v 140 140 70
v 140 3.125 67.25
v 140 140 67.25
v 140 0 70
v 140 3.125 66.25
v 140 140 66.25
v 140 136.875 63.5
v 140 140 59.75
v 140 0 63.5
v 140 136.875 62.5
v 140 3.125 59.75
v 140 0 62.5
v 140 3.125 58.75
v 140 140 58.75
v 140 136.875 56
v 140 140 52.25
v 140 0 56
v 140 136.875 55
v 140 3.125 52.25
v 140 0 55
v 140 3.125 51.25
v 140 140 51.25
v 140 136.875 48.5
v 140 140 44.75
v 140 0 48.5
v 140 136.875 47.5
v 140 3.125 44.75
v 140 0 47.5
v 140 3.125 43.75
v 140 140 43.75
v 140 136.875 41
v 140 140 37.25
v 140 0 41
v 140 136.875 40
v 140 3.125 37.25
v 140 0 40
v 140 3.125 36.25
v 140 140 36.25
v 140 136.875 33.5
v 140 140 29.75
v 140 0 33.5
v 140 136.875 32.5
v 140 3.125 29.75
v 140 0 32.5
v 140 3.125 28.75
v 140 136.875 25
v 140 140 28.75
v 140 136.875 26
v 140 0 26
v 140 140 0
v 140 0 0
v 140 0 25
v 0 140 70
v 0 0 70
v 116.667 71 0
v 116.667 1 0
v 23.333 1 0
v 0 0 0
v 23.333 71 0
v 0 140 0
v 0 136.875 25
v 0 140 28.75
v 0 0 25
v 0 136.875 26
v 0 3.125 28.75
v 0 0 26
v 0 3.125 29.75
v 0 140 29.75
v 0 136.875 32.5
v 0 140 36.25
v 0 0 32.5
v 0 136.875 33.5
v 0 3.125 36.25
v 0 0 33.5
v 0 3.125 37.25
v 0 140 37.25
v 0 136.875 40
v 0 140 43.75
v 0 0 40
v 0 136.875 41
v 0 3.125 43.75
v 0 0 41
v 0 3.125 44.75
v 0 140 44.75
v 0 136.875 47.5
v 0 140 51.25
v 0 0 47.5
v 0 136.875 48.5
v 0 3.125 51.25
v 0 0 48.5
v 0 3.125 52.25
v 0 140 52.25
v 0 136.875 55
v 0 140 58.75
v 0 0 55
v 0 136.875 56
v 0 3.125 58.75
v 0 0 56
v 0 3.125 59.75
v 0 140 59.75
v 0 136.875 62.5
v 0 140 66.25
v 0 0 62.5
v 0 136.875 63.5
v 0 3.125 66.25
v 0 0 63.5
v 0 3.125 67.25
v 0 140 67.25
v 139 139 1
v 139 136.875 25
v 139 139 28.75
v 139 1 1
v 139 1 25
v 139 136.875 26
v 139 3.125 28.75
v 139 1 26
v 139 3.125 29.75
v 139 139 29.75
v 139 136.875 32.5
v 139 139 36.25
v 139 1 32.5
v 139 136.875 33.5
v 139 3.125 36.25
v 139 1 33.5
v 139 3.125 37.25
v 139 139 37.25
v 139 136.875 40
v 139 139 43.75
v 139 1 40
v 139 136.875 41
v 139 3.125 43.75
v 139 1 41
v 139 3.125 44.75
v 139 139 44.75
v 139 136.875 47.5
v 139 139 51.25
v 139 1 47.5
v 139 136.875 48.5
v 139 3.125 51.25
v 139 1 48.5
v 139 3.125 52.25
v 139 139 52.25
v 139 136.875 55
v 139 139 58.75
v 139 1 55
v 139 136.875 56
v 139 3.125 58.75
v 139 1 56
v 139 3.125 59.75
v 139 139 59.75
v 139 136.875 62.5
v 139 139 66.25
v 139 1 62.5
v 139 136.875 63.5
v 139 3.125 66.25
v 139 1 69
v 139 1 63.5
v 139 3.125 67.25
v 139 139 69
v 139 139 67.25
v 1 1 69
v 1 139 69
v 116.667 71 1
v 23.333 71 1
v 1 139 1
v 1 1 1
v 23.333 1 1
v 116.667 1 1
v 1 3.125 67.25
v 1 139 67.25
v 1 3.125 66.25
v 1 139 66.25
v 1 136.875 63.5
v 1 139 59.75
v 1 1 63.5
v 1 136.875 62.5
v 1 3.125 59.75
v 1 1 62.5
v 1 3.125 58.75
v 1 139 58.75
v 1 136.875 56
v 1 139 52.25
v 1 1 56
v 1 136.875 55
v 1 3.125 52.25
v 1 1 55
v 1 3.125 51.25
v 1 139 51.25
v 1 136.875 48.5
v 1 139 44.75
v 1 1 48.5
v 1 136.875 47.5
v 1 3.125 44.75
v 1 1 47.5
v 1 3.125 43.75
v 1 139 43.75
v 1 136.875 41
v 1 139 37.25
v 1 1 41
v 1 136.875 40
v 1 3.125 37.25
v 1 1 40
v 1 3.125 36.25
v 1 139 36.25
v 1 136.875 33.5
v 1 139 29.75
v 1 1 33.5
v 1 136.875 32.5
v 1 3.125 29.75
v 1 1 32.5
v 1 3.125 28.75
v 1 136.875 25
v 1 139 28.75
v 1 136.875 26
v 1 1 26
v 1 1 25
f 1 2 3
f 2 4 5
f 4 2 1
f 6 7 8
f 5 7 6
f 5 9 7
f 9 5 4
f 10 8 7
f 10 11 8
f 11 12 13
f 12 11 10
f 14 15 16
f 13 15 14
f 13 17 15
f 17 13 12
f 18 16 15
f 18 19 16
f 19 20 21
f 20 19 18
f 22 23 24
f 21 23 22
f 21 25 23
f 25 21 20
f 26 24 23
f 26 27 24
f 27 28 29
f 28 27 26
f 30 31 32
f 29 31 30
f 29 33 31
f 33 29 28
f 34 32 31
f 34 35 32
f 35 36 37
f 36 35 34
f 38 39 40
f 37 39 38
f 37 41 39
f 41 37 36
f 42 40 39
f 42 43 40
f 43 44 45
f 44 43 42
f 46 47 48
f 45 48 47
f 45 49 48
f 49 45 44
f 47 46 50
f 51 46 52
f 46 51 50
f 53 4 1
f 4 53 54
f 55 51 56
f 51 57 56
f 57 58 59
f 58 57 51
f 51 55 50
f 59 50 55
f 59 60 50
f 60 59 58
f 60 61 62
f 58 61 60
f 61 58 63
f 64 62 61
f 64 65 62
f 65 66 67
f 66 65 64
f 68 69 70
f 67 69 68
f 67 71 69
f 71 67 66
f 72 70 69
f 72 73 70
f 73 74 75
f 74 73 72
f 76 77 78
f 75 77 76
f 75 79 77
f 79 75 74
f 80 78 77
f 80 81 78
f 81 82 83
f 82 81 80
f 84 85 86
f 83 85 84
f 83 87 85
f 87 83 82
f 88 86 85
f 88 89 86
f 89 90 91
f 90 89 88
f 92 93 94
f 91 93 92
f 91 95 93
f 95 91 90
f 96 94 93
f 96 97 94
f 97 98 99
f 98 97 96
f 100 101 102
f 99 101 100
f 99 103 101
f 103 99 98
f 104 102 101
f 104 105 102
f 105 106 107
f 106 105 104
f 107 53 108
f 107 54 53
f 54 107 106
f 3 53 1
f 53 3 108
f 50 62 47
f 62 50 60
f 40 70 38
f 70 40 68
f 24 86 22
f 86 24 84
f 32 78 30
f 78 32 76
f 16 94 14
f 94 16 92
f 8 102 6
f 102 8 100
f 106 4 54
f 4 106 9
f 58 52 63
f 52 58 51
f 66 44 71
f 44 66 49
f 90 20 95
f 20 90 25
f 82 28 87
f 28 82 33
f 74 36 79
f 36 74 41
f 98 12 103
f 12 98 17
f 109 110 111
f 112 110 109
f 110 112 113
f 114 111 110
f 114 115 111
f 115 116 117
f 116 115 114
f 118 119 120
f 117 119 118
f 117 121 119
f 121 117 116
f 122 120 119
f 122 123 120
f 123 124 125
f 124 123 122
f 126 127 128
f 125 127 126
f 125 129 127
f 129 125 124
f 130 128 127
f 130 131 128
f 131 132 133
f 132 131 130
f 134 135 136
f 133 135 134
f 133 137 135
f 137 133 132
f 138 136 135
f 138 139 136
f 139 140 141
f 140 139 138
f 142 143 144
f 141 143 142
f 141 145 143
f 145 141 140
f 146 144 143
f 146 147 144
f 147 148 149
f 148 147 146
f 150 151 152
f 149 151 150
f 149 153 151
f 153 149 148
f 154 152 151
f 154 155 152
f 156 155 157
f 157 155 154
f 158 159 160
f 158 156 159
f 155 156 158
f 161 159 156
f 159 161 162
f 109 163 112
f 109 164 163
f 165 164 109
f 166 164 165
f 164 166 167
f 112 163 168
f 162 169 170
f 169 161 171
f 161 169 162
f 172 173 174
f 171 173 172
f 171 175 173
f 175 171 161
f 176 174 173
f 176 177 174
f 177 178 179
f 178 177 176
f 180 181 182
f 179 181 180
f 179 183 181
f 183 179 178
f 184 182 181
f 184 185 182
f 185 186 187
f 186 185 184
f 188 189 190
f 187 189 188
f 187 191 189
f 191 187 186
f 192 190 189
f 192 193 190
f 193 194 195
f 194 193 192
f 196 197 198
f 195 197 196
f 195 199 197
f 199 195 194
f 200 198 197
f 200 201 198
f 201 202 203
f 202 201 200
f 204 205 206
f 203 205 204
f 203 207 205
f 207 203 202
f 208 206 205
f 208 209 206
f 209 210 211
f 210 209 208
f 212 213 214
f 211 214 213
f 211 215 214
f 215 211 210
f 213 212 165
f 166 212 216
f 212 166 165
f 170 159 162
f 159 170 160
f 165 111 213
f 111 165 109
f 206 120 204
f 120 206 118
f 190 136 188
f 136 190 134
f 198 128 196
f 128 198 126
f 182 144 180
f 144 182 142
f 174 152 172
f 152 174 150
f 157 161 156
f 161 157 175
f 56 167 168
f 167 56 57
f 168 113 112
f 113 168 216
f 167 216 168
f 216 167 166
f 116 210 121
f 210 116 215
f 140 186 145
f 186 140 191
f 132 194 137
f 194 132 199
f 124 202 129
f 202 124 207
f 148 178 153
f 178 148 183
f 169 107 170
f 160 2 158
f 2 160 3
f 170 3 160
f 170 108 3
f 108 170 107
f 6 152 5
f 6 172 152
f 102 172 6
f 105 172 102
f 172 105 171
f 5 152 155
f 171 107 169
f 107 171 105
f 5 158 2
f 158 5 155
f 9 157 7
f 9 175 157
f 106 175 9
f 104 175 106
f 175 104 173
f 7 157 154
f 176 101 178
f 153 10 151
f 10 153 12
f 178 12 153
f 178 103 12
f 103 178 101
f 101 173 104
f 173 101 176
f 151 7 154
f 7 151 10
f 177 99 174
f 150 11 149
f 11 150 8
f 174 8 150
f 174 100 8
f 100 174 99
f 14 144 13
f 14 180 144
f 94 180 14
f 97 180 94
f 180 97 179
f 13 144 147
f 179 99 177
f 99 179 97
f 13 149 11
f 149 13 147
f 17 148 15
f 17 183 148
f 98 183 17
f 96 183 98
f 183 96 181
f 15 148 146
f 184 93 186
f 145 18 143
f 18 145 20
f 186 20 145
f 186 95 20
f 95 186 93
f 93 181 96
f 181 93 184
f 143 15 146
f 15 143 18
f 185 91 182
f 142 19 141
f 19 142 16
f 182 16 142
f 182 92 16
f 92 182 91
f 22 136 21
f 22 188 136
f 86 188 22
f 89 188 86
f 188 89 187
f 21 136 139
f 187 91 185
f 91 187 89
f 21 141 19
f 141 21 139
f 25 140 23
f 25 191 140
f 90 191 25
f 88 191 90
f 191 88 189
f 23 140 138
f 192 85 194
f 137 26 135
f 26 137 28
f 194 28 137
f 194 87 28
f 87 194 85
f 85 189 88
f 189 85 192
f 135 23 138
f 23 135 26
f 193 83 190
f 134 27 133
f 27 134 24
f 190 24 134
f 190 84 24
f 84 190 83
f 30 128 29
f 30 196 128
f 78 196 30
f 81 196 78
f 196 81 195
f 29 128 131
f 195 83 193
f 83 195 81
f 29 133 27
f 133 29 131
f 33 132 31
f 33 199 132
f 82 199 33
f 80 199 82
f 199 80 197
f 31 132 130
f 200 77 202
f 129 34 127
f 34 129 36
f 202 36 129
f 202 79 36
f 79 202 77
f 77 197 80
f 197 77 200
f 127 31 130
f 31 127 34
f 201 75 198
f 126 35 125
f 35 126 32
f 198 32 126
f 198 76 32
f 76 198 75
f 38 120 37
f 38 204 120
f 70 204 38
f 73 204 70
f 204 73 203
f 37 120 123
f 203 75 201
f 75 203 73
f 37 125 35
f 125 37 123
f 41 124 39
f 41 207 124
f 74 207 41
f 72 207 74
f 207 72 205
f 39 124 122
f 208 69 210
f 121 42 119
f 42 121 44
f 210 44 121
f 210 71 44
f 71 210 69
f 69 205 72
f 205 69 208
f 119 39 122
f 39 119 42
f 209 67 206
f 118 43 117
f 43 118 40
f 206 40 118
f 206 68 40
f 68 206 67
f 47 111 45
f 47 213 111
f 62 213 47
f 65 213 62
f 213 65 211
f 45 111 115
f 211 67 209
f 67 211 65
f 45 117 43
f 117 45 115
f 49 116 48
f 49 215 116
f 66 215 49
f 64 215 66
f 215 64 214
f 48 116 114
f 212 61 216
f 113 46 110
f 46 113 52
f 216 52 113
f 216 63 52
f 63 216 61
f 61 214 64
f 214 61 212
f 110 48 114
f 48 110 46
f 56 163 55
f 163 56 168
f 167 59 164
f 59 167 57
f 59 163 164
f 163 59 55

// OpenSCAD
module lamp(width, length, height, thickness, bottom_space, hole_count, hole_thickness) {


	module block() {
		cube(size = [width, length, height], center = false);
	}

	module inside() {
		translate([thickness, thickness, thickness])
			cube(size = [width - 2*thickness, length - 2*thickness, height - 2*thickness], center = false);
	}

	module gaps() {
		hole_distance = (height - bottom_space) / hole_count;

		for (i = [1 : hole_count]) {
			translate([-2.5, (i % 2) * 1.5*hole_distance - 2.5, height - hole_distance * i]) {
				cube(size = [width+5, 5+(length - 1.5*hole_distance), hole_thickness], center = false);
			}
		}
	}

	module bottom_hole() {
		translate([width/6, thickness, -thickness/2])
			cube([width*2/3, length/2, 2*thickness]);
	}

	difference() {
		difference() {
			difference() {
				block();
				inside();
			}
			gaps();
		}
		bottom_hole();
	}
}

color("orange")
	lamp(140, 140, 70, 1, 25, 12, 1);
